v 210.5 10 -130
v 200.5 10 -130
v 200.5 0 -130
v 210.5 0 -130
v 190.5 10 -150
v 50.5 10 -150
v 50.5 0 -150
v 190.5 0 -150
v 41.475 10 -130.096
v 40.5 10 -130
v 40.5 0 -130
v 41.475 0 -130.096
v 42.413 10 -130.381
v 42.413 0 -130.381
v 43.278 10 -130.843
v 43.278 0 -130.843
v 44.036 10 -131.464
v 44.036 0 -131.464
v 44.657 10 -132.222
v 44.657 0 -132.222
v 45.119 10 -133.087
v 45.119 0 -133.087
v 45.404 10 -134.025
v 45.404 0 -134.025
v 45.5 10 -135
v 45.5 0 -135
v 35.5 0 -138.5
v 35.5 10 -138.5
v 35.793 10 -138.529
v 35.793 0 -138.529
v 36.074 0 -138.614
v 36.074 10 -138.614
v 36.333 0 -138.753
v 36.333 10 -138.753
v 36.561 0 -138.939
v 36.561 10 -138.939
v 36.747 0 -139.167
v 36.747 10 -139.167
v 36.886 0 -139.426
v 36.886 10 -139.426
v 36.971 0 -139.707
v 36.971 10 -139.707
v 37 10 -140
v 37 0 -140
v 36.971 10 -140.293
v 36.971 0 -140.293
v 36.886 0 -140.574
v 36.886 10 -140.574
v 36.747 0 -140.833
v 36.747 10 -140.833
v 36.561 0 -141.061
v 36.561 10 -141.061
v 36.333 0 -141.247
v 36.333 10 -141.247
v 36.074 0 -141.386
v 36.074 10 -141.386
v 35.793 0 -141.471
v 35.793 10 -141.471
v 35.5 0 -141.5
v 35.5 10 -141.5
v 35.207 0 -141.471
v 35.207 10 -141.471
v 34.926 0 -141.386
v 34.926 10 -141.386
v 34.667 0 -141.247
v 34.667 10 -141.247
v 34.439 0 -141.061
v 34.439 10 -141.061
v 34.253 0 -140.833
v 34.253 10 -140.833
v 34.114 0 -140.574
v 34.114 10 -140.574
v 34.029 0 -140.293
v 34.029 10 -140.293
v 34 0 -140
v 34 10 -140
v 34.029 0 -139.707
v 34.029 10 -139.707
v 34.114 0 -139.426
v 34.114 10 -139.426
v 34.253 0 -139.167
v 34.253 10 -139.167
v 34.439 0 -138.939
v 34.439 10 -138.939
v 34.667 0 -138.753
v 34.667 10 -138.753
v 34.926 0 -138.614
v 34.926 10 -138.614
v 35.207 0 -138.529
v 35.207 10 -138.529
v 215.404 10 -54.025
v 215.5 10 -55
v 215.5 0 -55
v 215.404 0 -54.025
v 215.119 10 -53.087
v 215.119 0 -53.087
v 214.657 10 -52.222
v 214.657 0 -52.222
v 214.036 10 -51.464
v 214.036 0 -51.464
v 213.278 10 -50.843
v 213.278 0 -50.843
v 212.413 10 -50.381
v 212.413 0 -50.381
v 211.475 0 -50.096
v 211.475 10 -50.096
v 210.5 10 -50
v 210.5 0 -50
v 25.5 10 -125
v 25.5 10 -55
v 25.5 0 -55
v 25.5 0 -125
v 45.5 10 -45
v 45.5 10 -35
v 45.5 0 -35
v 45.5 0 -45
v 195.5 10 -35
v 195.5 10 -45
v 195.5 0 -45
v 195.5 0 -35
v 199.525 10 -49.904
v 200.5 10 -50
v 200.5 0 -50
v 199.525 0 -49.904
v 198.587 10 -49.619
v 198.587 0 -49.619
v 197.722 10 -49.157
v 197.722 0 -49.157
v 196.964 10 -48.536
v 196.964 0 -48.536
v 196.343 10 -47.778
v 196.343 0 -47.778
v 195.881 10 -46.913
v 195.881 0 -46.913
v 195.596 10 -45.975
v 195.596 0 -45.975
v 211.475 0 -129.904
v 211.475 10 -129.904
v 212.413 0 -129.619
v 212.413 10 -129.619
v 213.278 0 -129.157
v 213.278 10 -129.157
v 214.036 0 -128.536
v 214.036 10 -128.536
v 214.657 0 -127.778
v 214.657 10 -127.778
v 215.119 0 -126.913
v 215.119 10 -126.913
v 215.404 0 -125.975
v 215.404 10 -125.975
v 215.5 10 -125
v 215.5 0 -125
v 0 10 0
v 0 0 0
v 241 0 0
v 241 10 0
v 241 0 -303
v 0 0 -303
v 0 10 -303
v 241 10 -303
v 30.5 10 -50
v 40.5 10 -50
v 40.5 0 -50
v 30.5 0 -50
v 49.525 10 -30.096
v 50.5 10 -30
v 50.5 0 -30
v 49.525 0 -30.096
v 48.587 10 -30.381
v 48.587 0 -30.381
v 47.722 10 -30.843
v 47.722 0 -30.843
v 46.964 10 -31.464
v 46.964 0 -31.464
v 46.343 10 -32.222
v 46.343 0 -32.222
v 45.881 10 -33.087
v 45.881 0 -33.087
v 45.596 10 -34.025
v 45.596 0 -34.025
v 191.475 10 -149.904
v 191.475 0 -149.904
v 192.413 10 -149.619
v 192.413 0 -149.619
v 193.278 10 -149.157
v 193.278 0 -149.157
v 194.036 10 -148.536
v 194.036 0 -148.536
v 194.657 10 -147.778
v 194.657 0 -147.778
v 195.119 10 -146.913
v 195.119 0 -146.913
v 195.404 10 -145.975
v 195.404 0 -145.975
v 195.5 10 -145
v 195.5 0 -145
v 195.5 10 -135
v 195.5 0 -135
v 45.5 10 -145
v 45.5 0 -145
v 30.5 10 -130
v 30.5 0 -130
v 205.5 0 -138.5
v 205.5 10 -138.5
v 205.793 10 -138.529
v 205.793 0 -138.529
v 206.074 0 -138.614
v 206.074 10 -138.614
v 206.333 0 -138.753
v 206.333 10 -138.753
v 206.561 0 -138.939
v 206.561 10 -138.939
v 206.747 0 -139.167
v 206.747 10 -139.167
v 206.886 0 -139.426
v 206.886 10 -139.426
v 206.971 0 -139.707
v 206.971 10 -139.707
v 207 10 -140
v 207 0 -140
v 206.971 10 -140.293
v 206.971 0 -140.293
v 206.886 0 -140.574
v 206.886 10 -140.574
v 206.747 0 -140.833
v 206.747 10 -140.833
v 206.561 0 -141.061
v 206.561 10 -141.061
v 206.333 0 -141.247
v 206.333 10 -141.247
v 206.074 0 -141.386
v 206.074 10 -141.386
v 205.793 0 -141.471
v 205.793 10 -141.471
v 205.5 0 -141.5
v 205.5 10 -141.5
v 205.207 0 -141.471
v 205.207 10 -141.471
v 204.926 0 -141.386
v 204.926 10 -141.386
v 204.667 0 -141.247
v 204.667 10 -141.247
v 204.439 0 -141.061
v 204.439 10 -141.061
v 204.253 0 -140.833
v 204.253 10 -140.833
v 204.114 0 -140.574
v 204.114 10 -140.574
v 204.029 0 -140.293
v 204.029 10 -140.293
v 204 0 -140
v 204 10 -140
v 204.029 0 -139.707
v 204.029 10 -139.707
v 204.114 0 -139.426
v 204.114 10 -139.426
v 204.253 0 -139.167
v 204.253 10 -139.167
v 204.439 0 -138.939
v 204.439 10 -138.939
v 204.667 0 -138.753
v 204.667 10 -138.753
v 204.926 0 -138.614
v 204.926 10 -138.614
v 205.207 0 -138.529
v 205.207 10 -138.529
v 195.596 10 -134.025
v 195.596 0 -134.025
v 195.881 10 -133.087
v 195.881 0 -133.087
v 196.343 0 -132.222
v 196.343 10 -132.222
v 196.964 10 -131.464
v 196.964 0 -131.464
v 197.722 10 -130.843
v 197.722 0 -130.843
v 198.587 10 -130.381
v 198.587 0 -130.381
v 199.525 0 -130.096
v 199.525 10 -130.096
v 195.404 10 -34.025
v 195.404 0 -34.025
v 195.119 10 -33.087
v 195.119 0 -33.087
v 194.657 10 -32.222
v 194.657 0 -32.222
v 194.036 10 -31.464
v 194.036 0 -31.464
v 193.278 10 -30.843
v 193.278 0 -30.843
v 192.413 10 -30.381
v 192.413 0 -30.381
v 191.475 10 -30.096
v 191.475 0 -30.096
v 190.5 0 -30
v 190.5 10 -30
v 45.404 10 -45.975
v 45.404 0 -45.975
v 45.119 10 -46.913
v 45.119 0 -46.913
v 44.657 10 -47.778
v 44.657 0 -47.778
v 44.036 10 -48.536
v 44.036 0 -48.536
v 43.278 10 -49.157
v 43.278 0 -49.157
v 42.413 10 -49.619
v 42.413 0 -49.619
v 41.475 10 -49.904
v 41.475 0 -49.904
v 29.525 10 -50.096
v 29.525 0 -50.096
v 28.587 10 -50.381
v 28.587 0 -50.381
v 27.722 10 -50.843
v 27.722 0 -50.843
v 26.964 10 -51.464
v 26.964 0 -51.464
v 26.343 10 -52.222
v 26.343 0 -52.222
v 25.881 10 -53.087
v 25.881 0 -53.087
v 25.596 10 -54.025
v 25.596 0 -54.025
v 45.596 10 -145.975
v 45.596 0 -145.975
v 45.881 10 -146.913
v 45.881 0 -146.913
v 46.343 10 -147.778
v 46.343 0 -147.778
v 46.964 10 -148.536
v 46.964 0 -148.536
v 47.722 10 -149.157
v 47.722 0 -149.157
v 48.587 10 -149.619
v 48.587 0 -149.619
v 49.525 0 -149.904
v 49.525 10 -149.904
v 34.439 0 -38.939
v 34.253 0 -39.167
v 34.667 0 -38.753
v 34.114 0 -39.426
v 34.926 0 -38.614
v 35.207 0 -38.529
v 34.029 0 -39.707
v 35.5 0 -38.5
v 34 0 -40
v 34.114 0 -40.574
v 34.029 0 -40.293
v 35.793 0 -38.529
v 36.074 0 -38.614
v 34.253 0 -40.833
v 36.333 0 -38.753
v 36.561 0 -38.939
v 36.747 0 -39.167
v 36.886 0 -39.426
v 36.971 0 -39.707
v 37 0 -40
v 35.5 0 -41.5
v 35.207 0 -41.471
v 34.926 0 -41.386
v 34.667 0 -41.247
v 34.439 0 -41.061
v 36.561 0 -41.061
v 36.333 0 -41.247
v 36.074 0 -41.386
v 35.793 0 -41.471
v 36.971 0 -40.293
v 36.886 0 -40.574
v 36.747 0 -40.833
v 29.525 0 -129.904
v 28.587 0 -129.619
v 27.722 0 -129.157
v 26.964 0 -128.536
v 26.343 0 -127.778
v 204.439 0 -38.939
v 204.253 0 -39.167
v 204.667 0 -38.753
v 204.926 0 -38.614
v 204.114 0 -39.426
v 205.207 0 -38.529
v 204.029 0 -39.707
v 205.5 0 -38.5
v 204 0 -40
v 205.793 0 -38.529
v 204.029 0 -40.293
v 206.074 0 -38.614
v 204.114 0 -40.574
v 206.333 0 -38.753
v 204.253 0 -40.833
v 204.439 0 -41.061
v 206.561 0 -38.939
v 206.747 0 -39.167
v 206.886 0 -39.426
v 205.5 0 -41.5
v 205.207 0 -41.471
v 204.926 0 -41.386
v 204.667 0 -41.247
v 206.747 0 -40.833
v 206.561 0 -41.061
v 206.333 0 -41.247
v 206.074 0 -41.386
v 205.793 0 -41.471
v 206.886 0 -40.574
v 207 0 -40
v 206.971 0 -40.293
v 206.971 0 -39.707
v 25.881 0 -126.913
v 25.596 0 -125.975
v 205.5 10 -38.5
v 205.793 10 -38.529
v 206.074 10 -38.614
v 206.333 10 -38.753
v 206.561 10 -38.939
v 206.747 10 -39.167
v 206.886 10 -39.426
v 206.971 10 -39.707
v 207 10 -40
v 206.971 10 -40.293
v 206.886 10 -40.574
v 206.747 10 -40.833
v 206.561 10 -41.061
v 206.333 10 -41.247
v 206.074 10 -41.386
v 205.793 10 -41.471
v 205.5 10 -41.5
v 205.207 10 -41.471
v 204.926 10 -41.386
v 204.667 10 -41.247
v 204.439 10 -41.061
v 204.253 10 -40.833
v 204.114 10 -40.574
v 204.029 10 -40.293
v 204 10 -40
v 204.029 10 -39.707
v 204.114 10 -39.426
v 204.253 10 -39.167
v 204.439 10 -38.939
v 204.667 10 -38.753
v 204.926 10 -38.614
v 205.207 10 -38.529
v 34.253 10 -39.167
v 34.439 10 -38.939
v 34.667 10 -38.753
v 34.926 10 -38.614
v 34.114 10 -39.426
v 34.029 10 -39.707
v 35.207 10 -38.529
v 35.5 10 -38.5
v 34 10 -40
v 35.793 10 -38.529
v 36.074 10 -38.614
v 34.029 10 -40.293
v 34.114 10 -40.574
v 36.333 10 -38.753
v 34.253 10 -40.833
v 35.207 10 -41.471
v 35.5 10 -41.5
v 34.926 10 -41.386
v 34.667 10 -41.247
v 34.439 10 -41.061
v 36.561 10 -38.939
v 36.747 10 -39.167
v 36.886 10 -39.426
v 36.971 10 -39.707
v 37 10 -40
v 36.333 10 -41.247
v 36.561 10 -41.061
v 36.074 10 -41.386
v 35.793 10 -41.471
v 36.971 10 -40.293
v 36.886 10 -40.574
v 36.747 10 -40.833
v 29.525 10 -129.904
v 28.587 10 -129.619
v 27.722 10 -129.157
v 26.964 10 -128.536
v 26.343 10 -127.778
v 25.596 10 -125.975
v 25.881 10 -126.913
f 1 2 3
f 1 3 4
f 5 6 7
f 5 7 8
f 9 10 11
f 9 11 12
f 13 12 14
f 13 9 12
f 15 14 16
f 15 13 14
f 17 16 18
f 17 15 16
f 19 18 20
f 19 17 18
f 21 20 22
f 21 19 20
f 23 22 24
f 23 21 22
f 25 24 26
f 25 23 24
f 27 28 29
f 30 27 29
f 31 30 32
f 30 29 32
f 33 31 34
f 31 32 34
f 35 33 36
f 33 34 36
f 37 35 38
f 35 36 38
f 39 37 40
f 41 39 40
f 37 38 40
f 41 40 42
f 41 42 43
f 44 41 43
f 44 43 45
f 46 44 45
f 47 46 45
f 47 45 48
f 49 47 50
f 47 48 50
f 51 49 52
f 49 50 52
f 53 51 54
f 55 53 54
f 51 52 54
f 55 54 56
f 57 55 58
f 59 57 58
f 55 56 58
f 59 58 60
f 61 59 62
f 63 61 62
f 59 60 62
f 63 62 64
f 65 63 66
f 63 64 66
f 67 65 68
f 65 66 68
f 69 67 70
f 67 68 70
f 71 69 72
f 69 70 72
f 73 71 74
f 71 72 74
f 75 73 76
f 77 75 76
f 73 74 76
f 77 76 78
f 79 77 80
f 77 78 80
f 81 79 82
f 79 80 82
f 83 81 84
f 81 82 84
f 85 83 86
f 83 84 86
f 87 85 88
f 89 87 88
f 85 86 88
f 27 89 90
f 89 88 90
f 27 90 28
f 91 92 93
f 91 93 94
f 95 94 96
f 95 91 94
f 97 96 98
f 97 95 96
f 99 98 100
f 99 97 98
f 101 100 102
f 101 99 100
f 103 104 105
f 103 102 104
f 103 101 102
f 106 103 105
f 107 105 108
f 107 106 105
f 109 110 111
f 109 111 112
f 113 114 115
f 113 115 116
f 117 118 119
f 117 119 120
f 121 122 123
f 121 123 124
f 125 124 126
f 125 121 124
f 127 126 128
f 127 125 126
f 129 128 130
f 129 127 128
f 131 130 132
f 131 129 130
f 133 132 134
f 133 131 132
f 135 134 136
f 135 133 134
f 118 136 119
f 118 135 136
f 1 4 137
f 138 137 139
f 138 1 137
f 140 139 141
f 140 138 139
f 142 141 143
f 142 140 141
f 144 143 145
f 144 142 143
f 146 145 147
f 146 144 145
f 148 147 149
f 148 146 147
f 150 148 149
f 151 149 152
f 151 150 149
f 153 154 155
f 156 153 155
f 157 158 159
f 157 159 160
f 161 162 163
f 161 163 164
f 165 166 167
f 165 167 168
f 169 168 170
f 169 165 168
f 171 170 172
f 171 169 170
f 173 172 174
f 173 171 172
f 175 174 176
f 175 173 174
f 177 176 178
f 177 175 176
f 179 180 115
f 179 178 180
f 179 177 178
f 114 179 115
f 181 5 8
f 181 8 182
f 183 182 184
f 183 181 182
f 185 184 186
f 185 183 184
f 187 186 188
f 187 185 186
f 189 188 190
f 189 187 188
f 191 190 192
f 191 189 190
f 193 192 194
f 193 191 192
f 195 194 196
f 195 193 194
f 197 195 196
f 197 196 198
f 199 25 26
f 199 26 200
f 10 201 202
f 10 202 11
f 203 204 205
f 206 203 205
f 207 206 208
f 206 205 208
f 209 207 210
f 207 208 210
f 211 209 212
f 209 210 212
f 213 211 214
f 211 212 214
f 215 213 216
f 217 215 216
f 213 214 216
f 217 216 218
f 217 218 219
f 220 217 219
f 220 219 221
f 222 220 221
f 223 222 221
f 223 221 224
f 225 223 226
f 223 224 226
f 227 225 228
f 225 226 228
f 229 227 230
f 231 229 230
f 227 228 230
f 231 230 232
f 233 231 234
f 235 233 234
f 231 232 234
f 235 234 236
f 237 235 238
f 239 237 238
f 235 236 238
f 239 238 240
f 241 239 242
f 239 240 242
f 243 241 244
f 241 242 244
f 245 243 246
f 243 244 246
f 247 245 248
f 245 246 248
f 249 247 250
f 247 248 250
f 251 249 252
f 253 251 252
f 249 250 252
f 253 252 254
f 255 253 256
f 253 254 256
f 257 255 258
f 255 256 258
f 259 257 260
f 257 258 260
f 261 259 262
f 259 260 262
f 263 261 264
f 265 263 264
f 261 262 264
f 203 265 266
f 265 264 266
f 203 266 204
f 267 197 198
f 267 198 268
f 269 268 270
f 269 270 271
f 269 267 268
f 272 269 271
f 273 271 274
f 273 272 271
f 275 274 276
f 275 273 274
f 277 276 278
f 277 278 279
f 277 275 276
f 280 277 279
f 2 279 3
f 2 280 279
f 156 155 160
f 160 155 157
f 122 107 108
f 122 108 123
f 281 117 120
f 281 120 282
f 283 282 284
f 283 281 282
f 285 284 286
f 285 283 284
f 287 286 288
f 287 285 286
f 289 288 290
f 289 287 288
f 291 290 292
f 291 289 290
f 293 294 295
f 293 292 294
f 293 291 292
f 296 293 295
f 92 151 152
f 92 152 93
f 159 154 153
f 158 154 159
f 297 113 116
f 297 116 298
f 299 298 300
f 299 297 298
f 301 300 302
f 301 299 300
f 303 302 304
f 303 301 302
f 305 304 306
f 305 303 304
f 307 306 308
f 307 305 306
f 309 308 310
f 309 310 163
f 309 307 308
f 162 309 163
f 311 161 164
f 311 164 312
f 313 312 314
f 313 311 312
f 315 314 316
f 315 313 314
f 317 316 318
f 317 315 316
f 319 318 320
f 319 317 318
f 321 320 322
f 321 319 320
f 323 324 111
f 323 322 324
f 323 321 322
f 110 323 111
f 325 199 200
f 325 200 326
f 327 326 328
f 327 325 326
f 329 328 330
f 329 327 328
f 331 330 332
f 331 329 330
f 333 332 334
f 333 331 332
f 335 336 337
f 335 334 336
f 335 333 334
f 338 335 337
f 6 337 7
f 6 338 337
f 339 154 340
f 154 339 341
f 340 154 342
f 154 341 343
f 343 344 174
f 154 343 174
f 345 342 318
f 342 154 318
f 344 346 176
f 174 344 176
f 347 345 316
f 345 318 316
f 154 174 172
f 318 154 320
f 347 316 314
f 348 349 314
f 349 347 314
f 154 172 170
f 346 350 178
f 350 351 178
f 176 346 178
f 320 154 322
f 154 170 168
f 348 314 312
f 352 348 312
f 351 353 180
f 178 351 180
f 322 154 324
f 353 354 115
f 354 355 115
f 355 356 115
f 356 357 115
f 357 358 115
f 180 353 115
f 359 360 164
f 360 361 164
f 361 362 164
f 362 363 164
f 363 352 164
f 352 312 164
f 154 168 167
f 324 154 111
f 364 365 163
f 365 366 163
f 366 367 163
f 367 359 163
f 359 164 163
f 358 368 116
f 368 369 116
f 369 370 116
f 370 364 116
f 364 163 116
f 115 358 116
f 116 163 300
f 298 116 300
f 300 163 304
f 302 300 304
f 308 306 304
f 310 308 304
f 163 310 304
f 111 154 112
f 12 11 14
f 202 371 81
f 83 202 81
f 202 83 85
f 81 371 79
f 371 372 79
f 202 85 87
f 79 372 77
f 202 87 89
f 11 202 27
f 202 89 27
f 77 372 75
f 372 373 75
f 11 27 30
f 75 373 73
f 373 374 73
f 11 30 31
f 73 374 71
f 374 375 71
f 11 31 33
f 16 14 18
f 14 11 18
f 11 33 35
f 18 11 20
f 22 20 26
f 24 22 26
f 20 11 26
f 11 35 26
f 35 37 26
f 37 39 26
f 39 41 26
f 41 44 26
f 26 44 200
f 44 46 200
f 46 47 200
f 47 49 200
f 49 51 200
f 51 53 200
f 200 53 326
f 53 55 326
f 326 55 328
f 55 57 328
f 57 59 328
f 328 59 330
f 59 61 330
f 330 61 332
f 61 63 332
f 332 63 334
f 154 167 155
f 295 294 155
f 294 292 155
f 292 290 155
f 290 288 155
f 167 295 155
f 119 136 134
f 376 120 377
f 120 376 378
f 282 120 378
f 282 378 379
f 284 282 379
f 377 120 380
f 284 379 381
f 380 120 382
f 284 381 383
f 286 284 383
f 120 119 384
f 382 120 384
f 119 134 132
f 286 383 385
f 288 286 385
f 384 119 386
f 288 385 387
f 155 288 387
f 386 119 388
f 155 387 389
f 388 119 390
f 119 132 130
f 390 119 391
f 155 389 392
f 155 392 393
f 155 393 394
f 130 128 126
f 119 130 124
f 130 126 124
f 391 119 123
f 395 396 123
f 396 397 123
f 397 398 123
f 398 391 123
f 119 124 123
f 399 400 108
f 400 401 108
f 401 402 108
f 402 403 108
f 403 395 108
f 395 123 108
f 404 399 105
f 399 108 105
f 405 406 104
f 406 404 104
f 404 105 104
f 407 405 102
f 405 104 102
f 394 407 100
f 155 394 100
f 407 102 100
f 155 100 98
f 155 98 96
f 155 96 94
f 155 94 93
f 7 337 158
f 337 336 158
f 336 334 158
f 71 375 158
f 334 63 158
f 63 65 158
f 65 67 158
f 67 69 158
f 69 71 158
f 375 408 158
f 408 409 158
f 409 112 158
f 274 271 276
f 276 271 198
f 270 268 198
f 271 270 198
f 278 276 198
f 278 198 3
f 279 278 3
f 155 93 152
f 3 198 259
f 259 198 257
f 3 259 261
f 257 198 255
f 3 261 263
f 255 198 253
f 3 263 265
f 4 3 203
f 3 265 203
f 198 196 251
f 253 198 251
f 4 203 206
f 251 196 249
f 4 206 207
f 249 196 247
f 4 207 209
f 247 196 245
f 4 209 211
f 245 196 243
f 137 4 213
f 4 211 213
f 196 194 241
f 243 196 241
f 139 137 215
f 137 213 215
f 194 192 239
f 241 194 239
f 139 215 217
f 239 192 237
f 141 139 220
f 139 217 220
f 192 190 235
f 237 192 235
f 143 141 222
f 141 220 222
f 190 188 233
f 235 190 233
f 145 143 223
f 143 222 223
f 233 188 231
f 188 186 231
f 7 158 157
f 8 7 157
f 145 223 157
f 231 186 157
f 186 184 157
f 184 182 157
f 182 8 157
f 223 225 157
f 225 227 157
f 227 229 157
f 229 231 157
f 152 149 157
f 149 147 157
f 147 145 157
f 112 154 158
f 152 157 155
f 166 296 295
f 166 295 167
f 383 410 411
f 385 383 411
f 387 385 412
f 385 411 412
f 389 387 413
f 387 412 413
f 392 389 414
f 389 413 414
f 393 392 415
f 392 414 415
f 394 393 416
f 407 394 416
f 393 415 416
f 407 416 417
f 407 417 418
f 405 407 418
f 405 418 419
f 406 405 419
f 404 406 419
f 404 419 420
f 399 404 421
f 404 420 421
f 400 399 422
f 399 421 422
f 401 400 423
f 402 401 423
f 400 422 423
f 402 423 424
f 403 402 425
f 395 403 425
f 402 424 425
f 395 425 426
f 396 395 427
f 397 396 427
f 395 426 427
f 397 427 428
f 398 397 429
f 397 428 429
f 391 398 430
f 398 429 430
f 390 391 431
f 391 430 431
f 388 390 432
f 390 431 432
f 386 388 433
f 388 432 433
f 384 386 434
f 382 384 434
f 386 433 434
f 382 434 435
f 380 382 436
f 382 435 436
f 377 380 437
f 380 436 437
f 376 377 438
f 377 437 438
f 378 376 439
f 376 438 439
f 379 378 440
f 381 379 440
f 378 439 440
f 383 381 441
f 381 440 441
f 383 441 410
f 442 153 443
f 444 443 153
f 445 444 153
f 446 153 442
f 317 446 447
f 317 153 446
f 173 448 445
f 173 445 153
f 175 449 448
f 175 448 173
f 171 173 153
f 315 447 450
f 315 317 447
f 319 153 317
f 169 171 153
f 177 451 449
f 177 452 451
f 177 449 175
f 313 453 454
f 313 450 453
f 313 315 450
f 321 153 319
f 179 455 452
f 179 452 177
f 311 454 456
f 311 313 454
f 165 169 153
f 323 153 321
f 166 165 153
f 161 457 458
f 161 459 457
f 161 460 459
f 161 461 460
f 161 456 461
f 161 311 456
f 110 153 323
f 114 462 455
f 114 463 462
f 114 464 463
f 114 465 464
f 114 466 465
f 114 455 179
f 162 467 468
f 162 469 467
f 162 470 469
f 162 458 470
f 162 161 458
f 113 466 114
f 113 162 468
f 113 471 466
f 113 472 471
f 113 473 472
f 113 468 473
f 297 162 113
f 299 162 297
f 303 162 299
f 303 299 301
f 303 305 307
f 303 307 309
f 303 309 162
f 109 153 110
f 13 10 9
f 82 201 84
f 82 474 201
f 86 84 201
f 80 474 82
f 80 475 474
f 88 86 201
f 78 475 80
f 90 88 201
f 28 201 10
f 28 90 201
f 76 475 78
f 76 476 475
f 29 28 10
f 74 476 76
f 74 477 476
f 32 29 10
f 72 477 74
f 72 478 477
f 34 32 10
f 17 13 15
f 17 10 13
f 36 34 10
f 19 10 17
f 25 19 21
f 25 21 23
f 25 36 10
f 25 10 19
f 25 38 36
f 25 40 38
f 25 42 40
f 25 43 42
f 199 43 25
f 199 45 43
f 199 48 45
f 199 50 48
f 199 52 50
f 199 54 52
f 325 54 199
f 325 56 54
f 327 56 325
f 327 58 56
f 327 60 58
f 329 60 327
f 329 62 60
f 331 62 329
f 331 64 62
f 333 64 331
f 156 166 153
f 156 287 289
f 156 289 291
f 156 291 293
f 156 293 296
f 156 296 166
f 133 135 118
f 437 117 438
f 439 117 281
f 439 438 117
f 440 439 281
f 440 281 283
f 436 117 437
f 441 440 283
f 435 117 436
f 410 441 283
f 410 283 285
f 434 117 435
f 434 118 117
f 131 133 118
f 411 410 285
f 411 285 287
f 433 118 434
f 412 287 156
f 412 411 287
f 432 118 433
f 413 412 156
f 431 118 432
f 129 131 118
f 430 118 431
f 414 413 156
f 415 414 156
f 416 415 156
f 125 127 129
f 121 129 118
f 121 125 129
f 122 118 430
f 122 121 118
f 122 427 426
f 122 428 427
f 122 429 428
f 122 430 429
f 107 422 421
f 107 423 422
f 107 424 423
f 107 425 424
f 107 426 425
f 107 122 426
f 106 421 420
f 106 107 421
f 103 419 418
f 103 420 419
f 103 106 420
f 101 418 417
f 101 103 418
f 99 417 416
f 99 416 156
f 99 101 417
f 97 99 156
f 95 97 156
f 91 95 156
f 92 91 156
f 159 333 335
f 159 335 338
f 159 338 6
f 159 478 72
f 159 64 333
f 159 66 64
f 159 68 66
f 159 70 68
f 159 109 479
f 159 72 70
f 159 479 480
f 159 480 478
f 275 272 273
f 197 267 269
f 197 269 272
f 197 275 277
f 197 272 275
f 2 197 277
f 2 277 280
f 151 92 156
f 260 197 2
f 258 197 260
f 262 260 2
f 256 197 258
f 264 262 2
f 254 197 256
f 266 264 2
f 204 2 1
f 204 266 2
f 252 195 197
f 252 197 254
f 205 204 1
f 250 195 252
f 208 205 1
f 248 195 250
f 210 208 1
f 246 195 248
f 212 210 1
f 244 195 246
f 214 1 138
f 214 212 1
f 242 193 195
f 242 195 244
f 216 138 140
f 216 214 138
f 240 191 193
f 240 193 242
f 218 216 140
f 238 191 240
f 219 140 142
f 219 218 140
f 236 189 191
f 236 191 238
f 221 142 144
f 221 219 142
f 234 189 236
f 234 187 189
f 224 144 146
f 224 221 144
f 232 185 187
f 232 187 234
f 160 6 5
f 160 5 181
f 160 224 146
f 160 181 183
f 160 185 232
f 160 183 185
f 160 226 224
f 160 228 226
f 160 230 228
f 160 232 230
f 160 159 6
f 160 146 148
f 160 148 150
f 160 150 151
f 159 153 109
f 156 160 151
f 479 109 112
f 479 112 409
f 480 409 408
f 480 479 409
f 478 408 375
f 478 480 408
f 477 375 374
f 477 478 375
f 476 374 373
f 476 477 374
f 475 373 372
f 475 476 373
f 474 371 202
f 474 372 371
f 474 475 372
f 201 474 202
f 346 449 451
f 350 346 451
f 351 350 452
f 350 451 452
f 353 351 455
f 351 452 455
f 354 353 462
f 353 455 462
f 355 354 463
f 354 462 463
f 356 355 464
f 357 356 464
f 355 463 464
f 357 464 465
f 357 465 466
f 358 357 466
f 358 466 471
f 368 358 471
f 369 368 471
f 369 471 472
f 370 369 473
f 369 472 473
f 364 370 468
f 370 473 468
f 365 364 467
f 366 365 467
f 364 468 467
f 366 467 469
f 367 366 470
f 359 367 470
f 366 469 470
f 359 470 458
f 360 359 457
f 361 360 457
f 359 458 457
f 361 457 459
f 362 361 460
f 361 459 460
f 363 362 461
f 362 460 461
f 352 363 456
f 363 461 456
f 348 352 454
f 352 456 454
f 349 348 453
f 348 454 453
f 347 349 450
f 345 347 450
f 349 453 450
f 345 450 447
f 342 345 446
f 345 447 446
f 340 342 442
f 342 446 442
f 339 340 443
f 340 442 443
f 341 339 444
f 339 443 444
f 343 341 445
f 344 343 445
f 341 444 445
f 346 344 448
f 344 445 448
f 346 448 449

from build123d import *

# Parameters (mm, degrees)
SKETCH1_W           = 241
SKETCH1_H           = 303
BOSS_EXTRUDE1_DEPTH = 10
CUT_EXTRUDE1_DEPTH  = 388.285424461
SKETCH3_R           = 1.5
CUT_EXTRUDE2_DEPTH  = 10


with BuildPart() as part:
    # Sketch1 → Boss-Extrude1 (new body)
    with BuildSketch(Plane(origin=(0, 0, 0), x_dir=(1, 0, 0), z_dir=(0, 1, 0))):
        with Locations((120.5, 151.5)):
            Rectangle(SKETCH1_W, SKETCH1_H)
    extrude(amount=BOSS_EXTRUDE1_DEPTH)

    # Sketch2 → Cut-Extrude1 (cut, through all)
    with BuildSketch(Plane(origin=(0, 10, 0), x_dir=(1, 0, 0), z_dir=(0, 1, 0))):
        with BuildLine():
            Line((50.5, 150), (190.5, 150))
            ThreePointArc((190.5, 150), (194.035533906, 148.535533906), (195.5, 145))
            Line((195.5, 145), (195.5, 135))
            ThreePointArc((195.5, 135), (196.964466094, 131.464466094), (200.5, 130))
            Line((200.5, 130), (210.5, 130))
            ThreePointArc((210.5, 130), (214.035533906, 128.535533906), (215.5, 125))
            Line((215.5, 125), (215.5, 55))
            ThreePointArc((215.5, 55), (214.035533906, 51.464466094), (210.5, 50))
            Line((210.5, 50), (200.5, 50))
            ThreePointArc((200.5, 50), (196.964466094, 48.535533906), (195.5, 45))
            Line((195.5, 45), (195.5, 35))
            ThreePointArc((195.5, 35), (194.035533906, 31.464466094), (190.5, 30))
            Line((190.5, 30), (50.5, 30))
            ThreePointArc((50.5, 30), (46.964466094, 31.464466094), (45.5, 35))
            Line((45.5, 35), (45.5, 45))
            ThreePointArc((45.5, 45), (44.035533906, 48.535533906), (40.5, 50))
            Line((40.5, 50), (30.5, 50))
            ThreePointArc((30.5, 50), (26.964466094, 51.464466094), (25.5, 55))
            Line((25.5, 55), (25.5, 125))
            ThreePointArc((25.5, 125), (26.964466094, 128.535533906), (30.5, 130))
            Line((30.5, 130), (40.5, 130))
            ThreePointArc((40.5, 130), (44.035533906, 131.464466094), (45.5, 135))
            Line((45.5, 135), (45.5, 145))
            ThreePointArc((45.5, 145), (46.964466094, 148.535533906), (50.5, 150))
        make_face()
    extrude(amount=-CUT_EXTRUDE1_DEPTH, mode=Mode.SUBTRACT)

    # Sketch3 → Cut-Extrude2 (cut)
    with BuildSketch(Plane(origin=(0, 10, 0), x_dir=(1, 0, 0), z_dir=(0, 1, 0))):
        with Locations(Location((205.5, 140, 0), (0, 0, 270))):
            Circle(SKETCH3_R)
        with Locations(Location((35.5, 140, 0), (0, 0, 270))):
            Circle(SKETCH3_R)
        with Locations(Location((35.5, 40, 0), (0, 0, 270))):
            Circle(SKETCH3_R)
        with Locations(Location((205.5, 40, 0), (0, 0, 270))):
            Circle(SKETCH3_R)
    extrude(amount=-CUT_EXTRUDE2_DEPTH, mode=Mode.SUBTRACT)


solid = part.part
